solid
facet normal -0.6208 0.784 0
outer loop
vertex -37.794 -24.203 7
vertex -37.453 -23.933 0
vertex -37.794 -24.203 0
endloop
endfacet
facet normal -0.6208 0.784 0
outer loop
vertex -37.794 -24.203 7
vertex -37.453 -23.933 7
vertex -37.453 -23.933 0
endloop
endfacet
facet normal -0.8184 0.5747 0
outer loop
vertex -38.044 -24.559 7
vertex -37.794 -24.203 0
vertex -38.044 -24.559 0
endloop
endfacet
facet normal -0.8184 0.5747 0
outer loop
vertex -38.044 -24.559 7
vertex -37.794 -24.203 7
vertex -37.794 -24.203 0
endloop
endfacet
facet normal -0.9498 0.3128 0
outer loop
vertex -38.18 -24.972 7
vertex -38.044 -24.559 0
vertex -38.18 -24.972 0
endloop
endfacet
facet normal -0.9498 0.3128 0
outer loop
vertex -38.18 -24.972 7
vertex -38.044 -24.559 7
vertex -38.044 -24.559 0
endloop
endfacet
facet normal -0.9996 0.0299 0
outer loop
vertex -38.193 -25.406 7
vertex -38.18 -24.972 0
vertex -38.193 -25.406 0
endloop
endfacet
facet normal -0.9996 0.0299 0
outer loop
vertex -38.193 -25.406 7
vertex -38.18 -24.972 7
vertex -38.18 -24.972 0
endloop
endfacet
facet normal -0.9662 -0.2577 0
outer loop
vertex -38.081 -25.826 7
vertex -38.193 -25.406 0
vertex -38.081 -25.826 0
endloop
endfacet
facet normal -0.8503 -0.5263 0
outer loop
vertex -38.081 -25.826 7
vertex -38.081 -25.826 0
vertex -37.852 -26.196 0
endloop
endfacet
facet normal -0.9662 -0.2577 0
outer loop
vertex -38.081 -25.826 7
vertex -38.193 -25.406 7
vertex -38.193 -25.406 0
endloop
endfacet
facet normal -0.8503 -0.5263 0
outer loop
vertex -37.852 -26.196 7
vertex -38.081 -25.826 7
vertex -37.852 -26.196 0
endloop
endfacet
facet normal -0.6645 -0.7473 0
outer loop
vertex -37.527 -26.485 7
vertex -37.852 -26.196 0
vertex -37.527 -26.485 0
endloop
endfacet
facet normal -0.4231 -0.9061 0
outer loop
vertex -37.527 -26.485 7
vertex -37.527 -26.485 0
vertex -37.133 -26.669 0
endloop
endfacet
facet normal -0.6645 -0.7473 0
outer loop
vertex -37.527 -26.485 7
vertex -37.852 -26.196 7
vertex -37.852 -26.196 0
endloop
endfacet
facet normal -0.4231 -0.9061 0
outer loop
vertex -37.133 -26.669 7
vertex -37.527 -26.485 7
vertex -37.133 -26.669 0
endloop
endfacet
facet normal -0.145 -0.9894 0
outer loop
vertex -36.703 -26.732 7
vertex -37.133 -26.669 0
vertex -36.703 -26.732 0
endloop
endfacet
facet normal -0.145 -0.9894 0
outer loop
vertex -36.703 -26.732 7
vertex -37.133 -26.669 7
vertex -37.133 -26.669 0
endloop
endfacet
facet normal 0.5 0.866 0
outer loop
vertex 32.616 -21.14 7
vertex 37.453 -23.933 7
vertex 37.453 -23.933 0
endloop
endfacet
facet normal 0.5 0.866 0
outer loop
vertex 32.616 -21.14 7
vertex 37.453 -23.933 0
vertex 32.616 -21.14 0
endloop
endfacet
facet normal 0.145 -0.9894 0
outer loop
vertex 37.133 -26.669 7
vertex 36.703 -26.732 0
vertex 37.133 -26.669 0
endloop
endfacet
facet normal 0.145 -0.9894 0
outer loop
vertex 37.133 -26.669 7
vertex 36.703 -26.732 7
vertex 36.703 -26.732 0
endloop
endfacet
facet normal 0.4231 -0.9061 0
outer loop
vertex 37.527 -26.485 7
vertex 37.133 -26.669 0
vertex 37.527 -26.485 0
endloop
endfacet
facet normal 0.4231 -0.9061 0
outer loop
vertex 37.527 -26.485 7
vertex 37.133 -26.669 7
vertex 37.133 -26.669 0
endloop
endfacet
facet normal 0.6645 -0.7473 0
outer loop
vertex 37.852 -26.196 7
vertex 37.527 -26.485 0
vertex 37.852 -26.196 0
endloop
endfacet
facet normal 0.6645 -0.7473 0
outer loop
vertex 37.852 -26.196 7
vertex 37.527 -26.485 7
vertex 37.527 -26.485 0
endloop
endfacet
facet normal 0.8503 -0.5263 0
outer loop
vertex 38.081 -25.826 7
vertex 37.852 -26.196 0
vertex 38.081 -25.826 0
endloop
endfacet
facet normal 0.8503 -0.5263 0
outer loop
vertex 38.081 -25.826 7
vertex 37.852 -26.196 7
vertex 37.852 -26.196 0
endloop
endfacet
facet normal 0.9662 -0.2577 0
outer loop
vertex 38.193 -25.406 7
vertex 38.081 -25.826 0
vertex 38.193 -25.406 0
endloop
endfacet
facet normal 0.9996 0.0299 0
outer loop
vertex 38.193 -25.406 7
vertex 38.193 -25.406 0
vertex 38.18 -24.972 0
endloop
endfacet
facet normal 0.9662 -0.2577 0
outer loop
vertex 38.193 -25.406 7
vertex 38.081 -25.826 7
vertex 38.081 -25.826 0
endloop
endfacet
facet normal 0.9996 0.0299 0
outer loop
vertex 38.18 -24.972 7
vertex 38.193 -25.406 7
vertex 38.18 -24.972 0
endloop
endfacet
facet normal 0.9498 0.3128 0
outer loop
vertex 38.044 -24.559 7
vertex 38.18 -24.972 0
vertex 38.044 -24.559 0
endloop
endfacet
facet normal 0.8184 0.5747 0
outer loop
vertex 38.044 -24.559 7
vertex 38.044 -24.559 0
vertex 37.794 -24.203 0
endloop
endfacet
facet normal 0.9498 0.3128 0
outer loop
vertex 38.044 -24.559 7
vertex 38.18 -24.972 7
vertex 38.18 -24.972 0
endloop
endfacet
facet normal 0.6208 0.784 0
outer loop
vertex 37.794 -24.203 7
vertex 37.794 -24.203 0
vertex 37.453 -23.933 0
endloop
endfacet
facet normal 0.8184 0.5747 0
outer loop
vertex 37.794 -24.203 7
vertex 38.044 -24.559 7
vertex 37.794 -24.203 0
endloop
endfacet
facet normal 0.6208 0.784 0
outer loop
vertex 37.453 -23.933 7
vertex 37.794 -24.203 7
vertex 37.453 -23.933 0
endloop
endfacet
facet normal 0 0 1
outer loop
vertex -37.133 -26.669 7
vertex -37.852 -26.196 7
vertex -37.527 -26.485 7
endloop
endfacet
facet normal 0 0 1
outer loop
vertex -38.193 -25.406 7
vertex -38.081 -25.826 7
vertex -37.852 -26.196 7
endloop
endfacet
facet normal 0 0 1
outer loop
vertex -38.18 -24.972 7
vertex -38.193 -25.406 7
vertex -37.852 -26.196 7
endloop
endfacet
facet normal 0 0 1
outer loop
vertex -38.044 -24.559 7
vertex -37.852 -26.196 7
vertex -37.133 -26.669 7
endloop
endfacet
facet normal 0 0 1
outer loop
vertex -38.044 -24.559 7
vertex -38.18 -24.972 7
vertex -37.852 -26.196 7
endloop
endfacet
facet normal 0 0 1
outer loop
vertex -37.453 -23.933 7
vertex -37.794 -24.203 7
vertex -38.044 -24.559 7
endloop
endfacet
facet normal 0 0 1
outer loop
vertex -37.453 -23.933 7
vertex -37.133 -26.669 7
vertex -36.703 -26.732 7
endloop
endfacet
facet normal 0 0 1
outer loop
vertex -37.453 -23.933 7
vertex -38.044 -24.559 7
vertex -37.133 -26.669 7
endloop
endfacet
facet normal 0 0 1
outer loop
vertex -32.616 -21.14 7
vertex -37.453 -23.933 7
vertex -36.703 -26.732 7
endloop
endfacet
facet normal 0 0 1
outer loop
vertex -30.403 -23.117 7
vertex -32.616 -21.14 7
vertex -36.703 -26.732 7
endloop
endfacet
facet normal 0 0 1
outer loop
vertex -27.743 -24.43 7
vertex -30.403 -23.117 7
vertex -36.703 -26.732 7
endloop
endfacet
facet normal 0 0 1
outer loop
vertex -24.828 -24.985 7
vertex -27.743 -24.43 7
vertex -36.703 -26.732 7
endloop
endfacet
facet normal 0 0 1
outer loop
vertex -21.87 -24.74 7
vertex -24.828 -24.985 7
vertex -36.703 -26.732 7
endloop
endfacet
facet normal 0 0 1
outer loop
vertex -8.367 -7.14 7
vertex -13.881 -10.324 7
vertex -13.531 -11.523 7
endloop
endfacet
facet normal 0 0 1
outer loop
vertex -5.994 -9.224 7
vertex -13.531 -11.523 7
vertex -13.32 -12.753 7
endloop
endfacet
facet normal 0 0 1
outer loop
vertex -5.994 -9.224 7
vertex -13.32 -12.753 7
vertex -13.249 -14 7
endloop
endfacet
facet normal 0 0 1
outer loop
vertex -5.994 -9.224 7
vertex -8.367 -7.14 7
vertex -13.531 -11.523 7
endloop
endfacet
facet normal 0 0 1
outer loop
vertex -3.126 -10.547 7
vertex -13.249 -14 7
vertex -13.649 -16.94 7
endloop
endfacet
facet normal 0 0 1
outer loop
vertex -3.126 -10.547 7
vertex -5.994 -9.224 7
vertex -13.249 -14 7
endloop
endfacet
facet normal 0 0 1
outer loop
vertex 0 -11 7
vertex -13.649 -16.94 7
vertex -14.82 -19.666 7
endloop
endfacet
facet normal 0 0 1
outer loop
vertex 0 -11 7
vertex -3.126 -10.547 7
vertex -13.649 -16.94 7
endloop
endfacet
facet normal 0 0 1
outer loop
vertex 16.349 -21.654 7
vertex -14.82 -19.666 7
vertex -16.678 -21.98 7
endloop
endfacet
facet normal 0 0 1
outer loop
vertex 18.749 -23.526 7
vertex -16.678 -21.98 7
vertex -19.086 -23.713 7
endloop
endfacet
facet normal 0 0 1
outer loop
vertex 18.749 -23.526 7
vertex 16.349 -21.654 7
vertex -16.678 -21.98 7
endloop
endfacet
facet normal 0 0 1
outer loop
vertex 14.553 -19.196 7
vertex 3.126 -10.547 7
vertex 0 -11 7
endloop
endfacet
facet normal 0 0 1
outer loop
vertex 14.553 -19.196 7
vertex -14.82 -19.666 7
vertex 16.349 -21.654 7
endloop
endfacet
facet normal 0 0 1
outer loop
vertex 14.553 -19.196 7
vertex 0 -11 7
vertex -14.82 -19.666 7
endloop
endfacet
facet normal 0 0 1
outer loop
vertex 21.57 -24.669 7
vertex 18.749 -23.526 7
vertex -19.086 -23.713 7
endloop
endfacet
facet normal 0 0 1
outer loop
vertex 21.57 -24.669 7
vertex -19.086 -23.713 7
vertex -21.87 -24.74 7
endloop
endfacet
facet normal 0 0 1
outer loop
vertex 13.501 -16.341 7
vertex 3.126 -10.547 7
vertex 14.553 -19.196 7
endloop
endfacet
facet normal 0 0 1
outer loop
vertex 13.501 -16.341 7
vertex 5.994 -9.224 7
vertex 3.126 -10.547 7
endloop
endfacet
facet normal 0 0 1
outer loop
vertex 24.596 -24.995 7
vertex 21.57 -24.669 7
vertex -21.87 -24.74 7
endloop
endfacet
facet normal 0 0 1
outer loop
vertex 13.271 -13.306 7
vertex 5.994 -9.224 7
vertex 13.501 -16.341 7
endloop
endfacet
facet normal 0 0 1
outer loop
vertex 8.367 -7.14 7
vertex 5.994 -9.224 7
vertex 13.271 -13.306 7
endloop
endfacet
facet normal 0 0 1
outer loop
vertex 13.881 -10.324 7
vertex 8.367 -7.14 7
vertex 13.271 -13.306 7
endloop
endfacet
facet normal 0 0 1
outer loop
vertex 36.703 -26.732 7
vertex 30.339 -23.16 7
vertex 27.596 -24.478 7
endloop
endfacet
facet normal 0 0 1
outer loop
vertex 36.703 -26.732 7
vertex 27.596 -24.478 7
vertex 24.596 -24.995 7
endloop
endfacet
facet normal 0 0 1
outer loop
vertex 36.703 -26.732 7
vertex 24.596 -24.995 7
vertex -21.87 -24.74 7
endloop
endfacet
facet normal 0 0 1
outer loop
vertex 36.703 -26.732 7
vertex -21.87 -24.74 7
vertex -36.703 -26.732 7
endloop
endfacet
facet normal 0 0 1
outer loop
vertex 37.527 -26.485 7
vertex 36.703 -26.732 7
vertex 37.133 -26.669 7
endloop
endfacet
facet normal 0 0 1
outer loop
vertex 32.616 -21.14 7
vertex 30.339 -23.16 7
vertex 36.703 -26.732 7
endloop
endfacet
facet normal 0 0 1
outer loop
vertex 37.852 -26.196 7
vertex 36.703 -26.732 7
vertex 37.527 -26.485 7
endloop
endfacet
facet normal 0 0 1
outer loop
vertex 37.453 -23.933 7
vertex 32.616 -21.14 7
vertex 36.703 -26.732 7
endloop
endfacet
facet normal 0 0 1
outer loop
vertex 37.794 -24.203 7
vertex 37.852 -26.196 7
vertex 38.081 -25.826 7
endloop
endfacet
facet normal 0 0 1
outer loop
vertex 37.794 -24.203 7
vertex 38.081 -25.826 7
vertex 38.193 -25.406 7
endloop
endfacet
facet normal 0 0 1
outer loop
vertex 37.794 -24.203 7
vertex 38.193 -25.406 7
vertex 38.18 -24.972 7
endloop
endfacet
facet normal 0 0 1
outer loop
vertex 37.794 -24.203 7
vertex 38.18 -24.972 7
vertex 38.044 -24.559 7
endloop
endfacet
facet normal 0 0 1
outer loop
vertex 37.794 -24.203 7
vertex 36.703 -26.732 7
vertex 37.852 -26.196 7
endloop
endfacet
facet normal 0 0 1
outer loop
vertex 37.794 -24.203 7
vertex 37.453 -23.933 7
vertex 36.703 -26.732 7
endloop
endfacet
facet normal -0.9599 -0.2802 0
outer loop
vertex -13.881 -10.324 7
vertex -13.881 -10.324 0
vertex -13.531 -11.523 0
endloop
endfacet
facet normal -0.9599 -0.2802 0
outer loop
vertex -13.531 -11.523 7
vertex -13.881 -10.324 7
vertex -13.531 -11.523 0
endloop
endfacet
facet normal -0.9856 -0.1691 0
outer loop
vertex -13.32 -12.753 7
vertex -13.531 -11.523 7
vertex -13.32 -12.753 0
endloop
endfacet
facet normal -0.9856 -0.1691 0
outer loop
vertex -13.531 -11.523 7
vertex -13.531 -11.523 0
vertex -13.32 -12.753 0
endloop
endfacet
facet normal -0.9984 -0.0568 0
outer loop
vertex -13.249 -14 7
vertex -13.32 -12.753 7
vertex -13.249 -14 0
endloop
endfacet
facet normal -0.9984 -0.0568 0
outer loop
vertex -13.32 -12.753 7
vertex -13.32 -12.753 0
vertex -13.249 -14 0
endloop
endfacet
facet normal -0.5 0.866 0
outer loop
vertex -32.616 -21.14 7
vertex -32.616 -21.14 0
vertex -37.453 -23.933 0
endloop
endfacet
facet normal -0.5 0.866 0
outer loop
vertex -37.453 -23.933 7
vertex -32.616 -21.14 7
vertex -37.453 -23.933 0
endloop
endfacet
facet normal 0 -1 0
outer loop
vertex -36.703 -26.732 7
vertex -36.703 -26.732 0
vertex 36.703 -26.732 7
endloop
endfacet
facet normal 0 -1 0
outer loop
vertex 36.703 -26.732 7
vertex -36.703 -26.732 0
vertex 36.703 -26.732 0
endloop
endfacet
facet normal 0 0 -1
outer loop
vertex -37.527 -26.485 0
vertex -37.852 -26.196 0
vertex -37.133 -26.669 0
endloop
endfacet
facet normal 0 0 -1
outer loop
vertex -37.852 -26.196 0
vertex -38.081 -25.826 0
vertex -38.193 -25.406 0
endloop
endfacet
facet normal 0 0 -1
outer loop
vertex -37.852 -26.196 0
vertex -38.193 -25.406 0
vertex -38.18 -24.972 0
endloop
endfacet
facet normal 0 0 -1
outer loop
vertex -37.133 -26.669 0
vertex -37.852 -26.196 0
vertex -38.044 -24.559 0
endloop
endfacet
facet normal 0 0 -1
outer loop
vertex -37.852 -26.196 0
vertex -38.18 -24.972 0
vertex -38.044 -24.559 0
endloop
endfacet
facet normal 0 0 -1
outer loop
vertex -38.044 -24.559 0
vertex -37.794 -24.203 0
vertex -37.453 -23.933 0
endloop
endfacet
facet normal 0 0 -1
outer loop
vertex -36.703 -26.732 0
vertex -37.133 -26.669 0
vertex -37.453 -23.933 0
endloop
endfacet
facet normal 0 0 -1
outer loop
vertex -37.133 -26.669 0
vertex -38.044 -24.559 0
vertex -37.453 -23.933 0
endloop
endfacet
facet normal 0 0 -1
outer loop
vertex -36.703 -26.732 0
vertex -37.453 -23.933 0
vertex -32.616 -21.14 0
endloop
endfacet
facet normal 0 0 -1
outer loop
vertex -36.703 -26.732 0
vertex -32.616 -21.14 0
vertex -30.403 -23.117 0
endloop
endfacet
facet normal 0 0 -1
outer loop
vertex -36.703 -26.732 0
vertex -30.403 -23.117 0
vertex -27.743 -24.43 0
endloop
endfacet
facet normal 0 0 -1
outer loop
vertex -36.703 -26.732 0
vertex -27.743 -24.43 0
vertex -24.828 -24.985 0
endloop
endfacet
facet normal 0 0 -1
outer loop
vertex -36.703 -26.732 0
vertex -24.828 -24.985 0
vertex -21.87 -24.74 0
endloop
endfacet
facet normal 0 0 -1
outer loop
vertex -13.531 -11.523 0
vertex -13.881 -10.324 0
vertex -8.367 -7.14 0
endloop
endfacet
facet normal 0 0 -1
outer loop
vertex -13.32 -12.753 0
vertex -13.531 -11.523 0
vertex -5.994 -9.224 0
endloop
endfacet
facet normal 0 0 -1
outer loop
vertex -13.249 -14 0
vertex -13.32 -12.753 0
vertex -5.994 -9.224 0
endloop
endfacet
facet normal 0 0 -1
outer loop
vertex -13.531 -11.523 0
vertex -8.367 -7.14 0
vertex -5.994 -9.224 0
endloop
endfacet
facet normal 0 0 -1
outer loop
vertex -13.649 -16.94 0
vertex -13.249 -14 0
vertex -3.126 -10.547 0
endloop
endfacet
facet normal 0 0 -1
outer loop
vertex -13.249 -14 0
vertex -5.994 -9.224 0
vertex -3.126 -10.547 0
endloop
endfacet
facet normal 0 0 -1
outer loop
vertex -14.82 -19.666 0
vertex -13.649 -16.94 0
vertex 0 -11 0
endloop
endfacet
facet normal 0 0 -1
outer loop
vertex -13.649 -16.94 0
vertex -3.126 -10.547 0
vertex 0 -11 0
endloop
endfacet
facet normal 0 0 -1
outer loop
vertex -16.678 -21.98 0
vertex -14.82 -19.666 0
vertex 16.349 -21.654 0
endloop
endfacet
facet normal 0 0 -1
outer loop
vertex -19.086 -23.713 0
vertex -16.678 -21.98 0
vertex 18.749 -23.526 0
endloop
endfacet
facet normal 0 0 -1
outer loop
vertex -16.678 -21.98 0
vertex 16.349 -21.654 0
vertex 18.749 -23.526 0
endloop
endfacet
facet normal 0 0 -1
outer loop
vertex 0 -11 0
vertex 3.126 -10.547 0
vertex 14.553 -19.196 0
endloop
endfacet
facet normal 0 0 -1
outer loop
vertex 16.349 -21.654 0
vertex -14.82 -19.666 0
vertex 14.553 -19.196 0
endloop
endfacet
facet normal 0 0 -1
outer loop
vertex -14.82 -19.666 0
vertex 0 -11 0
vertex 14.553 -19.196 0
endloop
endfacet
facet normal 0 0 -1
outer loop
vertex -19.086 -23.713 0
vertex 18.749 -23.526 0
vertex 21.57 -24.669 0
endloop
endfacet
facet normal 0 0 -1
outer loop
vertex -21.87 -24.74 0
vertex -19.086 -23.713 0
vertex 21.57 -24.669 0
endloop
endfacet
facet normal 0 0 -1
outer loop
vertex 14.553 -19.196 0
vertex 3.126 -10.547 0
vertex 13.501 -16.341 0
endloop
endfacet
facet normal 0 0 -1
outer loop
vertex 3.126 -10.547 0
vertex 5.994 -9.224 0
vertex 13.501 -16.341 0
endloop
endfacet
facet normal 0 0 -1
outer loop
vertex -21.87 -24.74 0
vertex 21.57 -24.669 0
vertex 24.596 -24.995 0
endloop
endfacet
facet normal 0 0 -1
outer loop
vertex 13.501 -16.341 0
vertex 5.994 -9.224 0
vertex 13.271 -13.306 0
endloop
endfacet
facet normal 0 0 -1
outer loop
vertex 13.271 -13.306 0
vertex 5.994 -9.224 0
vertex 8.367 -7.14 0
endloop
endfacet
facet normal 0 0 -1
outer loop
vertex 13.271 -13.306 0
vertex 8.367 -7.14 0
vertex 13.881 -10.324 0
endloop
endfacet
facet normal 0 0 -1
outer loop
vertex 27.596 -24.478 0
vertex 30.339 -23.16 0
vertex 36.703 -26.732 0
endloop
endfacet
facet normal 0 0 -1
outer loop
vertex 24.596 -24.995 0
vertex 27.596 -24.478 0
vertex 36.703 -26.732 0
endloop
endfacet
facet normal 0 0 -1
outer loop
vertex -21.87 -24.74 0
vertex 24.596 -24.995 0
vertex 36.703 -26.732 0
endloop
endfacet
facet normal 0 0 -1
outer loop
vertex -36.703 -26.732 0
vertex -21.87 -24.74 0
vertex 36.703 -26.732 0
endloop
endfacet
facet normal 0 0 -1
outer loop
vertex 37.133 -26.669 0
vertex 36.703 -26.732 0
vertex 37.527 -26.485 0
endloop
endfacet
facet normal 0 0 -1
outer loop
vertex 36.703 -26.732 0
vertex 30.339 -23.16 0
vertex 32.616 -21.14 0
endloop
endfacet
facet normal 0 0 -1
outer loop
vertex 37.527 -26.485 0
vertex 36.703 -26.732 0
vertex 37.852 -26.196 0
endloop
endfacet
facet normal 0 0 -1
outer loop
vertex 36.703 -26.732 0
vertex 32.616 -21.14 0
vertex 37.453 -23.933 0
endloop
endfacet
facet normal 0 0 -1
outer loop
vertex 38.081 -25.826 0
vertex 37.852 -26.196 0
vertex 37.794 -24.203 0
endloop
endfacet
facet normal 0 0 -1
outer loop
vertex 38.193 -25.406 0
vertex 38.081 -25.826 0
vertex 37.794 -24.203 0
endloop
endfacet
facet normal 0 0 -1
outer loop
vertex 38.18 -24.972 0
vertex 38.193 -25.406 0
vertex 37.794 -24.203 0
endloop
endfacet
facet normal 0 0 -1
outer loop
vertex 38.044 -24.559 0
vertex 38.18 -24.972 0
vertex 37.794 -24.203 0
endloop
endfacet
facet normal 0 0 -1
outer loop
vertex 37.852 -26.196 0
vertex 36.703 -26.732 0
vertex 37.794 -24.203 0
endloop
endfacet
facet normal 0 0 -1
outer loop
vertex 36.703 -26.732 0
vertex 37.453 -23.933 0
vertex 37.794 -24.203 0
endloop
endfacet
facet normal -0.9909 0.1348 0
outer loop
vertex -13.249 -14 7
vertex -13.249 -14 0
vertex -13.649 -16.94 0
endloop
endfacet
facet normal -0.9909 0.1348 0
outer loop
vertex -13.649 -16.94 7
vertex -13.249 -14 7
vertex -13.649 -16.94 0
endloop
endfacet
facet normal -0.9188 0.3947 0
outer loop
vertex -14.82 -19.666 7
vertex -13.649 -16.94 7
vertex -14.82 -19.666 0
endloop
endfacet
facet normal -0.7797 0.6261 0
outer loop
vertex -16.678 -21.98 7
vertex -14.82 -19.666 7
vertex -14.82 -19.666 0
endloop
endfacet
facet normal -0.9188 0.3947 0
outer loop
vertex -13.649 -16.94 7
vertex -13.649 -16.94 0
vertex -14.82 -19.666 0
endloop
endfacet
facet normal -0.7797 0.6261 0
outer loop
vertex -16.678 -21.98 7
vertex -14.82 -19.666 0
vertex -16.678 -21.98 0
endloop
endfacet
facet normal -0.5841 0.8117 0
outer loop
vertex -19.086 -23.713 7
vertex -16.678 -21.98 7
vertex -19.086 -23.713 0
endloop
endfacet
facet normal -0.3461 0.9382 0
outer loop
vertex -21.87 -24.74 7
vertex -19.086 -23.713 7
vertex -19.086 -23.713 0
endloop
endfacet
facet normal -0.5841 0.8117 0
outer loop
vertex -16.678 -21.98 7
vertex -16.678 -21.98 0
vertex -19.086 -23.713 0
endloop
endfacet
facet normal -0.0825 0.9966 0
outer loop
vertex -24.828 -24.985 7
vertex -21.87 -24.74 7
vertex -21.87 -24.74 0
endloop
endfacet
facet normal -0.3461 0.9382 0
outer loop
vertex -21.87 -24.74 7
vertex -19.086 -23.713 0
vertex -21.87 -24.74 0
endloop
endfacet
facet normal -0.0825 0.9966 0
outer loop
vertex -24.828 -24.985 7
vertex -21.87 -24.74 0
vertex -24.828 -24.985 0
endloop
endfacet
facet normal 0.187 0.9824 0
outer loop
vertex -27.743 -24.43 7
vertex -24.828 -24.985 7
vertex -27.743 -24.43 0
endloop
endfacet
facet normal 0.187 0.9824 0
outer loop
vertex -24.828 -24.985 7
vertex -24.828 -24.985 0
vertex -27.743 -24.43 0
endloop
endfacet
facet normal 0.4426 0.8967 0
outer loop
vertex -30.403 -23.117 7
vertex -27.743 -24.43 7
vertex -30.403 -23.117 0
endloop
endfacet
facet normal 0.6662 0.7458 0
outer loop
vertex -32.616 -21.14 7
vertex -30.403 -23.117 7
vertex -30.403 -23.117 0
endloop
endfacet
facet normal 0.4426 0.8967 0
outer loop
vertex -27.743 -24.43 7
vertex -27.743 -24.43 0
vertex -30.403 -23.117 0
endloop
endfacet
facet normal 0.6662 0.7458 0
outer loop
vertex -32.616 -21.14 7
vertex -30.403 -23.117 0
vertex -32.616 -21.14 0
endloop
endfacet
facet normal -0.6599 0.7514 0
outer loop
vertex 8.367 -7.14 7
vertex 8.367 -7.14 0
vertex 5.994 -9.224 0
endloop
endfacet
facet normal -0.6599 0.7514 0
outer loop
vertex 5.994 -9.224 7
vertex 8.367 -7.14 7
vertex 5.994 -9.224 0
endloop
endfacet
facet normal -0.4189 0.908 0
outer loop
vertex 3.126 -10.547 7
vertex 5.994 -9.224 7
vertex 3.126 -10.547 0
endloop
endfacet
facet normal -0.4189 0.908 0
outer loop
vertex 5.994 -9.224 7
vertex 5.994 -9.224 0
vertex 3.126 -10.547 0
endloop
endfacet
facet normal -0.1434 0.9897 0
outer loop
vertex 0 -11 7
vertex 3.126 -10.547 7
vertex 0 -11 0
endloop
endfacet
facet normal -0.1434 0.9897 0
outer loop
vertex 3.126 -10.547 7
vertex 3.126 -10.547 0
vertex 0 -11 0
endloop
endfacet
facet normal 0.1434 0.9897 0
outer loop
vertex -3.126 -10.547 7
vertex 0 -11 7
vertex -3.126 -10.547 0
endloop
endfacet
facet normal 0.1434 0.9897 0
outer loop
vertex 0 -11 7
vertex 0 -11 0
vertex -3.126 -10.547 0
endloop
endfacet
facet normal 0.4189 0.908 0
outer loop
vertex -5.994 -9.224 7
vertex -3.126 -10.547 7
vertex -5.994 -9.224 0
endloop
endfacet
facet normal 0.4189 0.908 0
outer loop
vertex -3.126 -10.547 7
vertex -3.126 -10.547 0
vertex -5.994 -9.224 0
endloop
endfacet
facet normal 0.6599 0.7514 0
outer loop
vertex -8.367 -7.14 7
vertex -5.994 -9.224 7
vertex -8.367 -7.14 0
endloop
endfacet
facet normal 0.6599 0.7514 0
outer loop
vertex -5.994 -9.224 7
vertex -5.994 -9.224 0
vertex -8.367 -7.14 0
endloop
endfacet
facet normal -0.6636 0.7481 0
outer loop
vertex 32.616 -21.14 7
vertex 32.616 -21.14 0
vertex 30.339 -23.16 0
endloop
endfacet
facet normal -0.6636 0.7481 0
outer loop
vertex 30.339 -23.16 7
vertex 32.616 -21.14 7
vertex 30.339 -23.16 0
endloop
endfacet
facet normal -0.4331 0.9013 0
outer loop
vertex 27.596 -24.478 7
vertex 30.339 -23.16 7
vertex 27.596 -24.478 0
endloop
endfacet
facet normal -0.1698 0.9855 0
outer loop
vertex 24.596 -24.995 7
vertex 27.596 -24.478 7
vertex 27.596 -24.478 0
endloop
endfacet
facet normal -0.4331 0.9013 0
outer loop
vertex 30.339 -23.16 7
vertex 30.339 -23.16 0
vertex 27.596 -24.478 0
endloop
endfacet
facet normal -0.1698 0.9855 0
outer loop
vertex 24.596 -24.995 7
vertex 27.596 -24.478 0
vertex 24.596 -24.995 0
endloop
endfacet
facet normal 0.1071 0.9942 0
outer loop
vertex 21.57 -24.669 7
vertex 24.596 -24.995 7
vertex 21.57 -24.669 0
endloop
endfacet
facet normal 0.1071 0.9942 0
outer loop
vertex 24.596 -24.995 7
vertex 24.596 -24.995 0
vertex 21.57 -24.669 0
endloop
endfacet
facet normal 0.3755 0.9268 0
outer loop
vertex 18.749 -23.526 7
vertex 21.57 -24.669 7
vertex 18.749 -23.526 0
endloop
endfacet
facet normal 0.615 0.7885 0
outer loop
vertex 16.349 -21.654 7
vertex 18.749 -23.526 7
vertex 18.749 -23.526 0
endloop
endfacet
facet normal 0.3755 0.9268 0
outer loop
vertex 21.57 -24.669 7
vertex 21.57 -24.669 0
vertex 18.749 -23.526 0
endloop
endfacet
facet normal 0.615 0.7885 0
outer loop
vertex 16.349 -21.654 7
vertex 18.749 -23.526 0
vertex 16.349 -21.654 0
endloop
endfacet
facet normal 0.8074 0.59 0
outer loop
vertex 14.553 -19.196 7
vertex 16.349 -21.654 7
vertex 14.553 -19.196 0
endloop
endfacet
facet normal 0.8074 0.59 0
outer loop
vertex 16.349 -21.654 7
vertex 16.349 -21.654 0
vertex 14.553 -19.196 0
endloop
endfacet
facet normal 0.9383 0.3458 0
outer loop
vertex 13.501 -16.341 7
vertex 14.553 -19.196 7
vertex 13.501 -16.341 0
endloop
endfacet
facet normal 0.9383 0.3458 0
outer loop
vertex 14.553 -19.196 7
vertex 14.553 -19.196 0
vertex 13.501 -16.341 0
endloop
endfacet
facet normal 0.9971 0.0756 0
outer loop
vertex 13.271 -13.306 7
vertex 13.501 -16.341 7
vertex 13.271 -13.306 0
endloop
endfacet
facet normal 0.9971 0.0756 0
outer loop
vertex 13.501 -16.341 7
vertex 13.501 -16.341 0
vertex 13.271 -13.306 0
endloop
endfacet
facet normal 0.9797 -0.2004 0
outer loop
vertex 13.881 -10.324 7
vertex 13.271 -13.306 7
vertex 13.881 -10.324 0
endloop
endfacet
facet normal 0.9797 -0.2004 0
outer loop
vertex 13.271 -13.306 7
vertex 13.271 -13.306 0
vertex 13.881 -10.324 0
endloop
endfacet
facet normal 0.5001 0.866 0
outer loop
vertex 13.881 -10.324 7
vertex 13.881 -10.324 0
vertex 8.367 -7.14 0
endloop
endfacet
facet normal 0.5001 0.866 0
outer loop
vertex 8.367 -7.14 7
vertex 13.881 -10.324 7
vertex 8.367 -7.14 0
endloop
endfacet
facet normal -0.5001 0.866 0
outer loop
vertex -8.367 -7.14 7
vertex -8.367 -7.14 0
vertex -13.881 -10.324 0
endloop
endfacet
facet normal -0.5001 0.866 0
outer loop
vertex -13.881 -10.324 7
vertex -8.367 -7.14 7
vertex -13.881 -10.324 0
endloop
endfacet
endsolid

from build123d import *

# Parameters (mm, degrees)
F1_DEPTH = 7
F2_R     = 1.5


with BuildPart() as f1:
    # F0 (on Top) → F1 (new body)
    with BuildSketch(Plane.XY):
        with BuildLine():
            ThreePointArc((8.367497, -7.140378), (0, -11), (-8.367497, -7.140378))
            Line((-8.367497, -7.140378), (-13.881214, -10.323724))
            ThreePointArc((-13.881214, -10.323724), (-13.40799, -12.134855), (-13.248711, -14))
            ThreePointArc((-13.248711, -14), (-20.443614, -24.320912), (-32.616208, -21.140378))
            Line((-32.616208, -21.140378), (-42.30127, -26.732051))
            Line((-42.30127, -26.732051), (42.30127, -26.732051))
            Line((42.30127, -26.732051), (32.616208, -21.140378))
            ThreePointArc((32.616208, -21.140378), (18.748711, -23.526279), (13.881214, -10.323724))
            Line((13.881214, -10.323724), (8.367497, -7.140378))
        make_face()
    extrude(amount=F1_DEPTH)

    # F2
    f2_edges = [f1.edges().sort_by_distance(p)[0] for p in [
        (-42.30127, -26.732051, 3.5),
        (42.30127, -26.732051, 3.5),
    ]]
    fillet(f2_edges, radius=F2_R)


solid = f1.part
